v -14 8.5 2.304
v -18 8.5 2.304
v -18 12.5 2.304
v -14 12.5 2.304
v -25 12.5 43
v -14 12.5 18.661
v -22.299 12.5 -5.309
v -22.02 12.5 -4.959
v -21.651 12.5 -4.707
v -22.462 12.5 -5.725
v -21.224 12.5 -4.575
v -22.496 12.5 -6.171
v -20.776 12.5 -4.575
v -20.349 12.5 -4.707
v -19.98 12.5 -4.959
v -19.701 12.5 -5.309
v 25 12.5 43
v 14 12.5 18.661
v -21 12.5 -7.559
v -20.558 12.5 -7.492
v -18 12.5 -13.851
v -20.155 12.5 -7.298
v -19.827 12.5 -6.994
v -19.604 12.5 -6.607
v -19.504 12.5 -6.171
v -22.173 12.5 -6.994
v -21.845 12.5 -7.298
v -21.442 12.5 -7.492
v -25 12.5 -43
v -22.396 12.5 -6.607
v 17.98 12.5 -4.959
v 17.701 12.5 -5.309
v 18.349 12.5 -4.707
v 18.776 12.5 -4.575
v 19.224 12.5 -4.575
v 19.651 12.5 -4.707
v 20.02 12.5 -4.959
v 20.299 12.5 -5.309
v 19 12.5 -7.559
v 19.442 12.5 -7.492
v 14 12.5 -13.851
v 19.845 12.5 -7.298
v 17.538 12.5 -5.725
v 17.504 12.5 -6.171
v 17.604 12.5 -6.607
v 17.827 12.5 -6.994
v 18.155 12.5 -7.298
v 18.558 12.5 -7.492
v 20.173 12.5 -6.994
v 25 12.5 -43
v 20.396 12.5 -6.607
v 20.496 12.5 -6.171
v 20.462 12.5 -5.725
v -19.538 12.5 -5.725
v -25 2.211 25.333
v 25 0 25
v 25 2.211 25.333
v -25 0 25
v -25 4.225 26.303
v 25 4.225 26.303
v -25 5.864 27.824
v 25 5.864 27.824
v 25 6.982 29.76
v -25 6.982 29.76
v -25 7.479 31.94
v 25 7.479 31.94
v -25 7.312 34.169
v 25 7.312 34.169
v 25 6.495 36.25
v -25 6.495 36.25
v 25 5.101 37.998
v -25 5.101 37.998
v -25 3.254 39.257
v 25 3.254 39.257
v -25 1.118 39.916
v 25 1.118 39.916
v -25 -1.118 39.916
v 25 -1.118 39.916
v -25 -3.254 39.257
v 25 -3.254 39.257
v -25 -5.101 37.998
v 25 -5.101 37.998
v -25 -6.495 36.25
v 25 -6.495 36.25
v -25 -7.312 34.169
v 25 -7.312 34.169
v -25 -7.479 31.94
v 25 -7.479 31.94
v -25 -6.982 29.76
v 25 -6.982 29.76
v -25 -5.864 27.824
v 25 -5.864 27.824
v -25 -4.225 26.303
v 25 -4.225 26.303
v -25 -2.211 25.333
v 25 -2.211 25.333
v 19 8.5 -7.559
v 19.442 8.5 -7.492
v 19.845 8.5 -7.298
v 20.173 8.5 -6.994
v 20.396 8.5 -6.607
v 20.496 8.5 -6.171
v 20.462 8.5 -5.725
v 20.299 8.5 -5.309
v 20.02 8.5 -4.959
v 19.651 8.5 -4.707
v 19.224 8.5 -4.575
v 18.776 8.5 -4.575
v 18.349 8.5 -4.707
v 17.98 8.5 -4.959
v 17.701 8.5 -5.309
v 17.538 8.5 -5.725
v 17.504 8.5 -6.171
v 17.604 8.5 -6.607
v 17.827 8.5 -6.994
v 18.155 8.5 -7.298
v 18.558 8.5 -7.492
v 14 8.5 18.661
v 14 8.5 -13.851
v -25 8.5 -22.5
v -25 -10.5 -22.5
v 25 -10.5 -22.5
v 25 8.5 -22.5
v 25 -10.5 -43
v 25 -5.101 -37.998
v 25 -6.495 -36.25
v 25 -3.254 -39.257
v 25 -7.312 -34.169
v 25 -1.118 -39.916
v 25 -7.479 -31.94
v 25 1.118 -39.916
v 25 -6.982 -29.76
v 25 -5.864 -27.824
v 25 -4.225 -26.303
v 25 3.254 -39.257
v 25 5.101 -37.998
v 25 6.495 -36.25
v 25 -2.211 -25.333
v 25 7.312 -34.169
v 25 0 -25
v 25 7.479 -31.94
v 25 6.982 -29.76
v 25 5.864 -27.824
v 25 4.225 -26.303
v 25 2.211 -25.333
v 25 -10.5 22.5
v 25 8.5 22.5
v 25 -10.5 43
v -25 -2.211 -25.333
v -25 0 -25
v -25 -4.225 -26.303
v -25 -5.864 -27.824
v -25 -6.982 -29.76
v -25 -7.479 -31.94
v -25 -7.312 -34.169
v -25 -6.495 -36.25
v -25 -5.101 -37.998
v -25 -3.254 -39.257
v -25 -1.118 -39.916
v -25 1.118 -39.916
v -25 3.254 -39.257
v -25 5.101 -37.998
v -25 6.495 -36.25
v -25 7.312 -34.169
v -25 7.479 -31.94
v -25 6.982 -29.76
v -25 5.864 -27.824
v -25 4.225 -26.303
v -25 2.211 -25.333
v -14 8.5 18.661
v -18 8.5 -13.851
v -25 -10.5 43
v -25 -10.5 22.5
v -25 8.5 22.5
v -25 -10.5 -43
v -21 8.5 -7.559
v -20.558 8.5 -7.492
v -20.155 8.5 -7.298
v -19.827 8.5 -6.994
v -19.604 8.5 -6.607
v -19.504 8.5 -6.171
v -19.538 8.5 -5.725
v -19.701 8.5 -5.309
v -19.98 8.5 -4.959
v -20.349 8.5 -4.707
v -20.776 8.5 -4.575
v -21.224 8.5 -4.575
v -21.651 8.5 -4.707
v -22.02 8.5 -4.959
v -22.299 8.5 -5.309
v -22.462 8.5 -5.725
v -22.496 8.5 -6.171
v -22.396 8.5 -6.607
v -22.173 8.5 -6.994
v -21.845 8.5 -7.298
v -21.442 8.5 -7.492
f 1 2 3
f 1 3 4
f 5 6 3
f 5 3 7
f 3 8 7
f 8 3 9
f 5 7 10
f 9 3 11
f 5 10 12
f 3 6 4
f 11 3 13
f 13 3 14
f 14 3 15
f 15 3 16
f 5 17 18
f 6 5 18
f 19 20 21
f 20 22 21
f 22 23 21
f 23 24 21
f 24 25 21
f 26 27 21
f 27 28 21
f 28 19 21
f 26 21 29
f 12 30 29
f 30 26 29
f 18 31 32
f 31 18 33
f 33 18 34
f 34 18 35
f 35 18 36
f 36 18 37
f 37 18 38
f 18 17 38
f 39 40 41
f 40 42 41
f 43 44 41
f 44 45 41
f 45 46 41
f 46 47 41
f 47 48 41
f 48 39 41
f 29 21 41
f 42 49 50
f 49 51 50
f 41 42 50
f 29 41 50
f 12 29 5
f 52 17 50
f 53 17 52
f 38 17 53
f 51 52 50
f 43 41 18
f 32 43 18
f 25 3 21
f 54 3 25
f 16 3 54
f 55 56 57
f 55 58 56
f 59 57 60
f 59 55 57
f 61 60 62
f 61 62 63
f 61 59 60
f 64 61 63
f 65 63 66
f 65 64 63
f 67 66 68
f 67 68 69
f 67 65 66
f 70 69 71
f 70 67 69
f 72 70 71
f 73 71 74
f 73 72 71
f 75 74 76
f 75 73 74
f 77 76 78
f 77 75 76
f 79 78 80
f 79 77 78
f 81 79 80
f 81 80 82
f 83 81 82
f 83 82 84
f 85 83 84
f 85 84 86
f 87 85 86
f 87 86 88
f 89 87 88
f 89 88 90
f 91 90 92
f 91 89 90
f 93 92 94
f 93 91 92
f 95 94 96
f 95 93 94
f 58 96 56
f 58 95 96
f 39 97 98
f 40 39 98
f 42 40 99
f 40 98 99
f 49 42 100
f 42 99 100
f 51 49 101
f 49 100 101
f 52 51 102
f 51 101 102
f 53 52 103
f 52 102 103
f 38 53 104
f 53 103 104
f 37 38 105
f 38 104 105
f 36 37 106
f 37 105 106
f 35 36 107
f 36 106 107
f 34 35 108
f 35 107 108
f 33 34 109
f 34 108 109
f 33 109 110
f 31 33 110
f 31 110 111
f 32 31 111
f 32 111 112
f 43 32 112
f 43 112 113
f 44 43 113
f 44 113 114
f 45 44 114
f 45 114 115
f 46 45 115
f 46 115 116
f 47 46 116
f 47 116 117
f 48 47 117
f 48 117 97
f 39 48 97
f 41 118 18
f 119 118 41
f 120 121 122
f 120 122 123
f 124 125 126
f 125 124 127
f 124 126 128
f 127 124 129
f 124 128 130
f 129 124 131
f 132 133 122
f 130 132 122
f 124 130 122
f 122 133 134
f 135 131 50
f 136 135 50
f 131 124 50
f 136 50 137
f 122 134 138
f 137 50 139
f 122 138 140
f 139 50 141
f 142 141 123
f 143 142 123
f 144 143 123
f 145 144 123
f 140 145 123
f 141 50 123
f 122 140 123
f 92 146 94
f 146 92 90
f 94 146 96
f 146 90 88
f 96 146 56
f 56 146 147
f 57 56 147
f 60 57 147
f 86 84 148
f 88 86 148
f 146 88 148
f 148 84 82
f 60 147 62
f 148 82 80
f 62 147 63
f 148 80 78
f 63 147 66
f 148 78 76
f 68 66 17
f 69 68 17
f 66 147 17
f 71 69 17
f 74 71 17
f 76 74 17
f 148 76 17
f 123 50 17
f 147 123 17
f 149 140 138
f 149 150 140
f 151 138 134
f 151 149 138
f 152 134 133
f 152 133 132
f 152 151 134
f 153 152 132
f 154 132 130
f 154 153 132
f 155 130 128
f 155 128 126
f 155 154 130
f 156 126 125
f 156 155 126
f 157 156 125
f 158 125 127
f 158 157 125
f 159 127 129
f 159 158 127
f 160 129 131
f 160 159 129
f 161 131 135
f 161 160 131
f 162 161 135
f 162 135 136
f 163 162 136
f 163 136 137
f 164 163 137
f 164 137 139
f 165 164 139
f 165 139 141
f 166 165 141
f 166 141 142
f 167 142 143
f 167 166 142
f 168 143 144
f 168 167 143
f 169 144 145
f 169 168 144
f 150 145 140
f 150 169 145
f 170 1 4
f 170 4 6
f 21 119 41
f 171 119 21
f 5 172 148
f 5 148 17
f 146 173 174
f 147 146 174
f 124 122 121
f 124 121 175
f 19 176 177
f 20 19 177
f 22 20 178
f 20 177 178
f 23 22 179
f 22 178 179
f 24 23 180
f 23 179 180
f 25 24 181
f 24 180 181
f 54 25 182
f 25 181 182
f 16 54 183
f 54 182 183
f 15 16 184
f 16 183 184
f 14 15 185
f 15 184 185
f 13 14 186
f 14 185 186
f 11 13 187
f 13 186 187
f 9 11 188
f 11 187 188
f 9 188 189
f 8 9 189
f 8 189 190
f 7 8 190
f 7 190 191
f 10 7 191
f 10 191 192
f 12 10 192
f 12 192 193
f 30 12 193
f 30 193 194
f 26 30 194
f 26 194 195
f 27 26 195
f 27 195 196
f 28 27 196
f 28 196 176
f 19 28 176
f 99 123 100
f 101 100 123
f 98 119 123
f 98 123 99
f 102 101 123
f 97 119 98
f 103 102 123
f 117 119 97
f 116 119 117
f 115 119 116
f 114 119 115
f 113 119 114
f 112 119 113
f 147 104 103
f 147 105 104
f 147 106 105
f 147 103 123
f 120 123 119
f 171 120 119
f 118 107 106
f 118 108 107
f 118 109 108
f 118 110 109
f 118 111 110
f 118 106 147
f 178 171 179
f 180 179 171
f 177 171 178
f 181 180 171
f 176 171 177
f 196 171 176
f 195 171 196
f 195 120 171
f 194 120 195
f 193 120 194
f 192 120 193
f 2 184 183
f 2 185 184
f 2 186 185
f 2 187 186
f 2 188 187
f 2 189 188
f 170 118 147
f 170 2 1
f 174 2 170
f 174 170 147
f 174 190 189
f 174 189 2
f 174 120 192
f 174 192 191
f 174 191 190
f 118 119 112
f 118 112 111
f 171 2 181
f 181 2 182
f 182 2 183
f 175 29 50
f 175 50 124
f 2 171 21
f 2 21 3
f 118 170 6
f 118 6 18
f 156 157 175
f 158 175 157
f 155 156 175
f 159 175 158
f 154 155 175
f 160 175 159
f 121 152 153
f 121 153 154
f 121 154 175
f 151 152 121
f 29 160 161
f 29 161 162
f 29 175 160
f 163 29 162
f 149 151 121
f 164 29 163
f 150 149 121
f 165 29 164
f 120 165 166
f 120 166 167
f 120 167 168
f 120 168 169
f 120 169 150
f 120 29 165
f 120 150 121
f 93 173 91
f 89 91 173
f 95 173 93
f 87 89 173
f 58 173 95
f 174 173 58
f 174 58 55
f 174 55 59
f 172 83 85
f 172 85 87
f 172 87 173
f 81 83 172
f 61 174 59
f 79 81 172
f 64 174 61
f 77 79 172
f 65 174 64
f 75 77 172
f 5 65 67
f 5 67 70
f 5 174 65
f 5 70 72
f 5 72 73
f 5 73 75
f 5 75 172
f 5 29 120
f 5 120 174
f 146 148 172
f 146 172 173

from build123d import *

# Parameters (mm, degrees)
SKETCH1_R           = 7.5
BOSS_EXTRUDE1_DEPTH = 25
CUT_EXTRUDE1_DEPTH  = 34
SKETCH3_W           = 45
SKETCH3_H           = 19
CUT_EXTRUDE2_DEPTH  = 62
SKETCH4_R           = 1.5
CUT_EXTRUDE3_DEPTH  = 62


with BuildPart() as part:
    # Sketch1 → Boss-Extrude1 (new, symmetric)
    with BuildSketch(Plane(origin=(0, 0, 0), x_dir=(0, 0, -1), z_dir=(1, 0, 0))):
        Polygon((-32.5, -10.5), (-43, -10.5), (-43, 12.5), (43, 12.5), (43, -10.5), align=None)
        with Locations((-32.5, 0)):
            Circle(SKETCH1_R, mode=Mode.SUBTRACT)
        with Locations(Location((32.5, 0, 0), (0, 0, 180))):
            Circle(SKETCH1_R, mode=Mode.SUBTRACT)
    extrude(amount=BOSS_EXTRUDE1_DEPTH, both=True)

    # Sketch2 → Cut-Extrude1 (cut)
    with BuildSketch(Plane.XZ.offset(10.5)):
        Polygon((14, -13.850798543), (-18, -13.850798543), (-18, 2.304286058), (-14, 2.304286058), (-14, 18.660685655), (14, 18.660685655), align=None)
    extrude(amount=-CUT_EXTRUDE1_DEPTH, mode=Mode.SUBTRACT)

    # Sketch3 → Cut-Extrude2 (cut)
    with BuildSketch(Plane.ZY.offset(25)):
        with Locations((0, -1)):
            Rectangle(SKETCH3_W, SKETCH3_H)
    extrude(amount=-CUT_EXTRUDE2_DEPTH, mode=Mode.SUBTRACT)

    # Sketch4 → Cut-Extrude3 (cut)
    with BuildSketch(Plane.XZ.offset(-8.5)):
        with Locations(Location((-21, -6.058605683, 0), (0, 0, 270))):
            Circle(SKETCH4_R)
        with Locations(Location((19, -6.058605683, 0), (0, 0, 270))):
            Circle(SKETCH4_R)
    extrude(amount=-CUT_EXTRUDE3_DEPTH, mode=Mode.SUBTRACT)


solid = part.part
